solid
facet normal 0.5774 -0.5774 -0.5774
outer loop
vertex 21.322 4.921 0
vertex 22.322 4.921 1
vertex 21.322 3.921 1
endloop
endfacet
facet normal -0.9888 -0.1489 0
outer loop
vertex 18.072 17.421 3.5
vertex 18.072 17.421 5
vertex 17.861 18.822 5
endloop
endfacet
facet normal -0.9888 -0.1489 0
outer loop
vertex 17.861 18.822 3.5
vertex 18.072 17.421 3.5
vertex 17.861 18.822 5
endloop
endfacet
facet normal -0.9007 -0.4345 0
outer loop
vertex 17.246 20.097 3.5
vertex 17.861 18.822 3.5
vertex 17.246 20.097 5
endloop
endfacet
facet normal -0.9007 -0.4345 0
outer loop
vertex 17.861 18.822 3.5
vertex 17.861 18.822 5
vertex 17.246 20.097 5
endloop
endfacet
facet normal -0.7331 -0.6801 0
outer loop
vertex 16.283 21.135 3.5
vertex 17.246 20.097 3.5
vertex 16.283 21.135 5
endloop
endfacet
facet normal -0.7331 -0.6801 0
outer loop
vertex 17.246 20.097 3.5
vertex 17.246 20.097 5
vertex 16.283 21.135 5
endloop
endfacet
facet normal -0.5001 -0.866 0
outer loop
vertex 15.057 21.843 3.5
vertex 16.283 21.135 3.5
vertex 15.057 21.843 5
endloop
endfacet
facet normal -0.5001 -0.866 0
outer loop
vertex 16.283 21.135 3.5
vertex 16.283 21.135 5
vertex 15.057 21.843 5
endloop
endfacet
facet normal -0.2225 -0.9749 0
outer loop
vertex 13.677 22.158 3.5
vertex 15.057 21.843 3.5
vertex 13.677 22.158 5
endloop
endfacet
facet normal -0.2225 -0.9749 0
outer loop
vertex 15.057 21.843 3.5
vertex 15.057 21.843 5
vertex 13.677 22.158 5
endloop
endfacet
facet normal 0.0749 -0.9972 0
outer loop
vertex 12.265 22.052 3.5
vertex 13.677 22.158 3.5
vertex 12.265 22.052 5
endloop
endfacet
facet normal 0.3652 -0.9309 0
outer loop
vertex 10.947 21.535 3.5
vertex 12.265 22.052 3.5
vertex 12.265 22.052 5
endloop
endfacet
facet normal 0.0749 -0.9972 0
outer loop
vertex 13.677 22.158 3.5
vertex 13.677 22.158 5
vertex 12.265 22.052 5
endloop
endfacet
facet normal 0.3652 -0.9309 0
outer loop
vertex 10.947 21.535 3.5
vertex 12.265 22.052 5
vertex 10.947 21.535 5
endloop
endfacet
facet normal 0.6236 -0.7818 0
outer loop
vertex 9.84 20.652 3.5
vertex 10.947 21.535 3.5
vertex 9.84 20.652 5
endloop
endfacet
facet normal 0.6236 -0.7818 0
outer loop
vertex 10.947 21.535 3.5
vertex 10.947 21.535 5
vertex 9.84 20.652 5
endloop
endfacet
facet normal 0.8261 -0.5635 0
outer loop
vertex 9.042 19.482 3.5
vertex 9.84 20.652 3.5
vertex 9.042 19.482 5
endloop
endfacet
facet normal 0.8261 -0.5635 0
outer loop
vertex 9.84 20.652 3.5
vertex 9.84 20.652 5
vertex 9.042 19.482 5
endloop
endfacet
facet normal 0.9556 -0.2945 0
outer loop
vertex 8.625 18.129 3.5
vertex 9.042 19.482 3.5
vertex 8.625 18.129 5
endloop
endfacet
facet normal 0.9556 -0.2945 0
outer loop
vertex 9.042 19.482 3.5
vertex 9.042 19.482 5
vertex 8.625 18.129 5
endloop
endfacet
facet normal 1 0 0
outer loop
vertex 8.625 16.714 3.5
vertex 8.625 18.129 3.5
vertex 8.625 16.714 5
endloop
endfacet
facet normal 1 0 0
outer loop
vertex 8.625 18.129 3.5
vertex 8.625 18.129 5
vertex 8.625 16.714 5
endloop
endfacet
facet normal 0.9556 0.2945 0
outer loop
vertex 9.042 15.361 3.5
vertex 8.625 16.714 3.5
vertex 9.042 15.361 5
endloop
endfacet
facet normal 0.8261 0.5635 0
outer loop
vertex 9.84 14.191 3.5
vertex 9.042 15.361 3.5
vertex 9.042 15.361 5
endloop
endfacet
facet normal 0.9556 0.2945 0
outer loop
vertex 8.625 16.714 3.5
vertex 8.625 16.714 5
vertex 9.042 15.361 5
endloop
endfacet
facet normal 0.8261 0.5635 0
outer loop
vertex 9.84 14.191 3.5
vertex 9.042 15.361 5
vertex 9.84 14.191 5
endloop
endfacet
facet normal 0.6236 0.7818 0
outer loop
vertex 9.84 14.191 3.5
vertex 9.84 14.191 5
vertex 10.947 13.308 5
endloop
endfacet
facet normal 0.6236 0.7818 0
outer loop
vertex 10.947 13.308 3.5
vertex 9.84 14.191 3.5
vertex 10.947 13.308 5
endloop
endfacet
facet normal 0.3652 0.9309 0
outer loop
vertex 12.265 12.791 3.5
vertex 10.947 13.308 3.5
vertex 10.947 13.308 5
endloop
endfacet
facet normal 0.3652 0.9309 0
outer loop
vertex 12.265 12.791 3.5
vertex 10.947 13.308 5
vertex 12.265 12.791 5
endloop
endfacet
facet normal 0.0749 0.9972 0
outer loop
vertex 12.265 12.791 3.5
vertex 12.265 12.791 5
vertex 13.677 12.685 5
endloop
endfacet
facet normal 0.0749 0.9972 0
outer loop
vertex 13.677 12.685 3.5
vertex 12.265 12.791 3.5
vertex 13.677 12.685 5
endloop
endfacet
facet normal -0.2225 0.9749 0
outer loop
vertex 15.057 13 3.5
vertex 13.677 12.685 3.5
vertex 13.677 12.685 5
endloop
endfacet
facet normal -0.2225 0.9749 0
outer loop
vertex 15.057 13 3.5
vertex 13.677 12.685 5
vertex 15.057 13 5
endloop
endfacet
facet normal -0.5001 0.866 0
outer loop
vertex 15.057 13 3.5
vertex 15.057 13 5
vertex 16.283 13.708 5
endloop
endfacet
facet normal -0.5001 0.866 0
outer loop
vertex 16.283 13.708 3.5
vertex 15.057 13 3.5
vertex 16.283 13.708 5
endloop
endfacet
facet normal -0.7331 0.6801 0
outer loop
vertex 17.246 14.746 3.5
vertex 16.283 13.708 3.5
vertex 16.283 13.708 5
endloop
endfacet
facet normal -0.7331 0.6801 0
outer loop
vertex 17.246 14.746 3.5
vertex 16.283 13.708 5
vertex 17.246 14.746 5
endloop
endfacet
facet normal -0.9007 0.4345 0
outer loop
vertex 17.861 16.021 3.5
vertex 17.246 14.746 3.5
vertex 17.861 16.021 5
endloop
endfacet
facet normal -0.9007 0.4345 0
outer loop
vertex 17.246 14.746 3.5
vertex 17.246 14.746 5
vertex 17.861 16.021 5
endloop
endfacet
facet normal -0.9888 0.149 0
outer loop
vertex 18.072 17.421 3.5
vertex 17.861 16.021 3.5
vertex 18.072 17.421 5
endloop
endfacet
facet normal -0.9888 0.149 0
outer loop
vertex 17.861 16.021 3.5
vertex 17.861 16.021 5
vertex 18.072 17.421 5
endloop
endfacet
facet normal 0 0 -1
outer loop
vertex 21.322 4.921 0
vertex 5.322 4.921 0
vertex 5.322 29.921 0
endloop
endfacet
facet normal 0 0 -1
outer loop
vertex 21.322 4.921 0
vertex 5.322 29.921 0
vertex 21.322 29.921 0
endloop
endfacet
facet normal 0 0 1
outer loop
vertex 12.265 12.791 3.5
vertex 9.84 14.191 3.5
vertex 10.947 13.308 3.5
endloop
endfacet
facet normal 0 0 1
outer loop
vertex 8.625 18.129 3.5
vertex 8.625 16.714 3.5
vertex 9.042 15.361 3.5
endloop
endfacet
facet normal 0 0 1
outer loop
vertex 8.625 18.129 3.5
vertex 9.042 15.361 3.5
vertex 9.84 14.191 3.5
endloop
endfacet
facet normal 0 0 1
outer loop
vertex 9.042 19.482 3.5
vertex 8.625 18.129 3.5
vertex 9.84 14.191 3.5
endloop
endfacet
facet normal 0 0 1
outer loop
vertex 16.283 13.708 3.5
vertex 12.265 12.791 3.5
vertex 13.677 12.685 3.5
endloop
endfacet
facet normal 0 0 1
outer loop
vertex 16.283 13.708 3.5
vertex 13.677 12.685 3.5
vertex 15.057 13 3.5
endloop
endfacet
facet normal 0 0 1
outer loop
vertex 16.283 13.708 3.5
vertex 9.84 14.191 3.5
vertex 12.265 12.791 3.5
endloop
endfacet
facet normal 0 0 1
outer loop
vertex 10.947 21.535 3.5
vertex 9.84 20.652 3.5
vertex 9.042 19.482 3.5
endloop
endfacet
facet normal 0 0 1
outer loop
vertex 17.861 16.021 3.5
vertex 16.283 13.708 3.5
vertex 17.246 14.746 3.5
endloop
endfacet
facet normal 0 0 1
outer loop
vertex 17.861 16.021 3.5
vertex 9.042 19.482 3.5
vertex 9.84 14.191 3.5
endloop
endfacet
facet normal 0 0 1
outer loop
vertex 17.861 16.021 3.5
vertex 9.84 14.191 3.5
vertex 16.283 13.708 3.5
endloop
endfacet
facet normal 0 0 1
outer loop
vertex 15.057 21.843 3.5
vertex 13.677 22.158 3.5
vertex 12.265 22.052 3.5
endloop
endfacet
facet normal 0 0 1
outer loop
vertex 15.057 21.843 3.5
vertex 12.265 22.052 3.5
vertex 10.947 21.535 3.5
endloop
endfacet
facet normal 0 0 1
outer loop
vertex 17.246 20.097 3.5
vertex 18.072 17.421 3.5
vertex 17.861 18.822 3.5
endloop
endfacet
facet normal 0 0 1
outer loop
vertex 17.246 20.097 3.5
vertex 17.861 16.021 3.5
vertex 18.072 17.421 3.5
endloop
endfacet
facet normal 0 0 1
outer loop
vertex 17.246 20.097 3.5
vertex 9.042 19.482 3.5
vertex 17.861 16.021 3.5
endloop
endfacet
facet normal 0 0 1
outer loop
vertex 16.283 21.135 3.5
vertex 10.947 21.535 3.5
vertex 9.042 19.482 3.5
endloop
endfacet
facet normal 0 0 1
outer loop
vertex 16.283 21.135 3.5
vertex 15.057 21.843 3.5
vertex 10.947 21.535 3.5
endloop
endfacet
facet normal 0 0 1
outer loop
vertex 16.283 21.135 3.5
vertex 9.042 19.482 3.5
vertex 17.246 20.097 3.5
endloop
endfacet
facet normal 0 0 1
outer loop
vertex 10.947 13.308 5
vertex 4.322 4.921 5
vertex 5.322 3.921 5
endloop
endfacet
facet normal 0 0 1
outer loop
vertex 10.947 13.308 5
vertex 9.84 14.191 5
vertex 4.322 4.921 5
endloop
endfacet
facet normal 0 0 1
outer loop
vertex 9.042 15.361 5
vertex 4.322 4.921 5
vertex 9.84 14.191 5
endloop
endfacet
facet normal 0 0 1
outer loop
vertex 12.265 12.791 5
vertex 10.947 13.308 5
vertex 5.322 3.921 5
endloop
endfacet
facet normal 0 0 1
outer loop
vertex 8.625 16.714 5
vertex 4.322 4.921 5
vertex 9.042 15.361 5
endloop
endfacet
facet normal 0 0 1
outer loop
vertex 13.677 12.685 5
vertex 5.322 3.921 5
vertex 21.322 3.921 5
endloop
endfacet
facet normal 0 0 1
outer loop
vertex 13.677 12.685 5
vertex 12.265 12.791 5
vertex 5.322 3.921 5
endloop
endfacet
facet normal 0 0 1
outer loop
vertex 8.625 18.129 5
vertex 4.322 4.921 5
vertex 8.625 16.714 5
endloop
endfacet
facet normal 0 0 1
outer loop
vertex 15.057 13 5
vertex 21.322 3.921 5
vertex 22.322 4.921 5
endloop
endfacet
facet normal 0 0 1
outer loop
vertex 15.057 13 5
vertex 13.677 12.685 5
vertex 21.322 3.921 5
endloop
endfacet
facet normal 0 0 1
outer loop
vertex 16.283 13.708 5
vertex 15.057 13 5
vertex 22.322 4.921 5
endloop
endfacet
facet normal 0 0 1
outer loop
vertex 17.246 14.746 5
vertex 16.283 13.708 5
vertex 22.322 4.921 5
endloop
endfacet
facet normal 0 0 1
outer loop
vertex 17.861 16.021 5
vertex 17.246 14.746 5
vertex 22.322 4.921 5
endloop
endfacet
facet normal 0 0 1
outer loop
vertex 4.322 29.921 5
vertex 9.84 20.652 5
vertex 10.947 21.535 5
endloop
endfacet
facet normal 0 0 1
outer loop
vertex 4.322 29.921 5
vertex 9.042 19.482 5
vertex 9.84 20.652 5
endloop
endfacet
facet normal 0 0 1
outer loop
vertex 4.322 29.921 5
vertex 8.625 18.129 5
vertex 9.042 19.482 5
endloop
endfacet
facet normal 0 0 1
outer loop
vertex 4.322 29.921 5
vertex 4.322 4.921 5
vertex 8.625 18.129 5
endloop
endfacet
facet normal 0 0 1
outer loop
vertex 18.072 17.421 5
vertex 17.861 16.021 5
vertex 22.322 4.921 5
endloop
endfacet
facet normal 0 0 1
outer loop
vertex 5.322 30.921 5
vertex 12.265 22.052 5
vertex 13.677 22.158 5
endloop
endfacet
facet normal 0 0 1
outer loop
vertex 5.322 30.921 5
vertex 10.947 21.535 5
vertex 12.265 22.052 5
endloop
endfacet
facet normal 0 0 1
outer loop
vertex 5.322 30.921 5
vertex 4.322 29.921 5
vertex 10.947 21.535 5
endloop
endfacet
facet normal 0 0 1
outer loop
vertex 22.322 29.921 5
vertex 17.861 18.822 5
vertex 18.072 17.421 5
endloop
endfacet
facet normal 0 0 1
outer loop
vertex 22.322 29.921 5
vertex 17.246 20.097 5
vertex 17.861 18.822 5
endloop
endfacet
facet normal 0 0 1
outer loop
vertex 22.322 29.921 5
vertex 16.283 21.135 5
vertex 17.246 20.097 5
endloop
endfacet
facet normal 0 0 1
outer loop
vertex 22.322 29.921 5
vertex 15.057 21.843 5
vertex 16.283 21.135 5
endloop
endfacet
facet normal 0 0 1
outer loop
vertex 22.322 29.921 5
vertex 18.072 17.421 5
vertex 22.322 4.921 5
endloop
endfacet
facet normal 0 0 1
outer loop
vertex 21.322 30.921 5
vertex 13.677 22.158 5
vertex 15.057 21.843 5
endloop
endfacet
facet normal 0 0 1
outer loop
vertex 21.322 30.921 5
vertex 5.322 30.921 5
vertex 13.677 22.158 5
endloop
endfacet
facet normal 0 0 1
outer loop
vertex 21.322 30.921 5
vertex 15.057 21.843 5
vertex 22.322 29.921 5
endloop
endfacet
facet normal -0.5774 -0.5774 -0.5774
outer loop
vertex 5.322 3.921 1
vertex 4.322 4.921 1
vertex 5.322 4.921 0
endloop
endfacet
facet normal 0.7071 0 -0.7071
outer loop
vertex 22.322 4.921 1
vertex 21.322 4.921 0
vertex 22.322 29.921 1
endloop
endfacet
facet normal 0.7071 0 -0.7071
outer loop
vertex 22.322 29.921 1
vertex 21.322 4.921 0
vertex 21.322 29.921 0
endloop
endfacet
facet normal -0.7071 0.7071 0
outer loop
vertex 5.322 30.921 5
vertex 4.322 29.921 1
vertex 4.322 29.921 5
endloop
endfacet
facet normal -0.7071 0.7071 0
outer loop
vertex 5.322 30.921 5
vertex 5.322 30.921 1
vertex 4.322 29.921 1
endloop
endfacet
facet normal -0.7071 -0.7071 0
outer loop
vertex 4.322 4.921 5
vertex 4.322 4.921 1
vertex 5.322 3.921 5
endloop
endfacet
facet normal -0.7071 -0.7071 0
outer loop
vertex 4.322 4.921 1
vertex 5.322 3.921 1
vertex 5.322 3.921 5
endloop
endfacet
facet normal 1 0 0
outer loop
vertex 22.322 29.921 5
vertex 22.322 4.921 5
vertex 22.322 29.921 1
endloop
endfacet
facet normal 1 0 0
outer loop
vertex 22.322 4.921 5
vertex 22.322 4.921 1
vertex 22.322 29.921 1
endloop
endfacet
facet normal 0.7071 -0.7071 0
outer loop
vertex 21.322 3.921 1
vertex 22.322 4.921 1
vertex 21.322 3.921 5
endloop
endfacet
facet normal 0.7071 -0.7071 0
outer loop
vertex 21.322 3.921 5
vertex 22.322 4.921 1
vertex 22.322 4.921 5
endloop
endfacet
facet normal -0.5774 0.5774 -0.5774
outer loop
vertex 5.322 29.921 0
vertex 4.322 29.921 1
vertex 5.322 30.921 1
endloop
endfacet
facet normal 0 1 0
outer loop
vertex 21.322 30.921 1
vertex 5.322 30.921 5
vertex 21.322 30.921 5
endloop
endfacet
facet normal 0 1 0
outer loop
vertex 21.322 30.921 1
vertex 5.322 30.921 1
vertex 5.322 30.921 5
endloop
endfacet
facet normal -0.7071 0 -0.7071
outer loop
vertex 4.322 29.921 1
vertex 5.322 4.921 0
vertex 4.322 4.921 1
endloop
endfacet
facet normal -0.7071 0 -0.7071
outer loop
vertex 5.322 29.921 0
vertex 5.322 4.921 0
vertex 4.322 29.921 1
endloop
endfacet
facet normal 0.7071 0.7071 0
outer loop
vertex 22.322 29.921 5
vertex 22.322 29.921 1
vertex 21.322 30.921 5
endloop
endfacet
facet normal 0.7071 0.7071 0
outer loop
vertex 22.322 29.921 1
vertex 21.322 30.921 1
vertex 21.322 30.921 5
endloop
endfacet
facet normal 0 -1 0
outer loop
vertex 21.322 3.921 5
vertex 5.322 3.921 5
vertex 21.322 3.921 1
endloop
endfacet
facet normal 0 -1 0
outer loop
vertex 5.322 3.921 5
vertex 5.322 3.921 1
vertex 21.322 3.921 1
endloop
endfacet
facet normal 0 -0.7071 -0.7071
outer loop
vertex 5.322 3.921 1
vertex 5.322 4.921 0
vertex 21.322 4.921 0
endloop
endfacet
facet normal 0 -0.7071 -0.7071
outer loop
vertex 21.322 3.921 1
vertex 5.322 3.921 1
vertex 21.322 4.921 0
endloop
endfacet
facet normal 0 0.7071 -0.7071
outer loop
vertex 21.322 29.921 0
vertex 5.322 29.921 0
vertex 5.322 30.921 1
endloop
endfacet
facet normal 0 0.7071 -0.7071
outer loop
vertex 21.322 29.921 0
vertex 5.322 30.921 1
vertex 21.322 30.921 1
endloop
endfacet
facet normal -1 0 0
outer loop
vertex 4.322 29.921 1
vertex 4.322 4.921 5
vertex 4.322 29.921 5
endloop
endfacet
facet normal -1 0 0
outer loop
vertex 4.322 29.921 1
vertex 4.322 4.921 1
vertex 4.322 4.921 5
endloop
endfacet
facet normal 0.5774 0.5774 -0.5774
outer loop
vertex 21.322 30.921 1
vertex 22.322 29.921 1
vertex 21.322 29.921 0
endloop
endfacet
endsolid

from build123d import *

# Parameters (mm, degrees)
F0_W     = 18
F0_H     = 27
F1_DEPTH = 5
F2_SIZE  = 1
F3_R     = 4.75
F4_DEPTH = 1.5


with BuildPart() as f1:
    # F0 (on Top) → F1 (new body)
    with BuildSketch(Plane.XY):
        with Locations((13.321646, 17.421494)):
            Rectangle(F0_W, F0_H)
    extrude(amount=F1_DEPTH)

    # F2
    f2_edges = [f1.edges().sort_by_distance(p)[0] for p in [
        (4.321646, 30.921494, 2.5),
        (4.321646, 3.921494, 2.5),
        (22.321646, 3.921494, 2.5),
        (22.321646, 30.921494, 2.5),
        (22.321646, 17.421494, 0),
        (4.321646, 17.421494, 0),
        (13.321646, 3.921494, 0),
        (13.321646, 30.921494, 0),
    ]]
    chamfer(f2_edges, length=F2_SIZE)

    # F3 (on face) → F4 (cut)
    with BuildSketch(Plane.XY.offset(5)):
        with Locations((13.321646, 17.421494)):
            Circle(F3_R)
    extrude(amount=-F4_DEPTH, mode=Mode.SUBTRACT)


solid = f1.part
